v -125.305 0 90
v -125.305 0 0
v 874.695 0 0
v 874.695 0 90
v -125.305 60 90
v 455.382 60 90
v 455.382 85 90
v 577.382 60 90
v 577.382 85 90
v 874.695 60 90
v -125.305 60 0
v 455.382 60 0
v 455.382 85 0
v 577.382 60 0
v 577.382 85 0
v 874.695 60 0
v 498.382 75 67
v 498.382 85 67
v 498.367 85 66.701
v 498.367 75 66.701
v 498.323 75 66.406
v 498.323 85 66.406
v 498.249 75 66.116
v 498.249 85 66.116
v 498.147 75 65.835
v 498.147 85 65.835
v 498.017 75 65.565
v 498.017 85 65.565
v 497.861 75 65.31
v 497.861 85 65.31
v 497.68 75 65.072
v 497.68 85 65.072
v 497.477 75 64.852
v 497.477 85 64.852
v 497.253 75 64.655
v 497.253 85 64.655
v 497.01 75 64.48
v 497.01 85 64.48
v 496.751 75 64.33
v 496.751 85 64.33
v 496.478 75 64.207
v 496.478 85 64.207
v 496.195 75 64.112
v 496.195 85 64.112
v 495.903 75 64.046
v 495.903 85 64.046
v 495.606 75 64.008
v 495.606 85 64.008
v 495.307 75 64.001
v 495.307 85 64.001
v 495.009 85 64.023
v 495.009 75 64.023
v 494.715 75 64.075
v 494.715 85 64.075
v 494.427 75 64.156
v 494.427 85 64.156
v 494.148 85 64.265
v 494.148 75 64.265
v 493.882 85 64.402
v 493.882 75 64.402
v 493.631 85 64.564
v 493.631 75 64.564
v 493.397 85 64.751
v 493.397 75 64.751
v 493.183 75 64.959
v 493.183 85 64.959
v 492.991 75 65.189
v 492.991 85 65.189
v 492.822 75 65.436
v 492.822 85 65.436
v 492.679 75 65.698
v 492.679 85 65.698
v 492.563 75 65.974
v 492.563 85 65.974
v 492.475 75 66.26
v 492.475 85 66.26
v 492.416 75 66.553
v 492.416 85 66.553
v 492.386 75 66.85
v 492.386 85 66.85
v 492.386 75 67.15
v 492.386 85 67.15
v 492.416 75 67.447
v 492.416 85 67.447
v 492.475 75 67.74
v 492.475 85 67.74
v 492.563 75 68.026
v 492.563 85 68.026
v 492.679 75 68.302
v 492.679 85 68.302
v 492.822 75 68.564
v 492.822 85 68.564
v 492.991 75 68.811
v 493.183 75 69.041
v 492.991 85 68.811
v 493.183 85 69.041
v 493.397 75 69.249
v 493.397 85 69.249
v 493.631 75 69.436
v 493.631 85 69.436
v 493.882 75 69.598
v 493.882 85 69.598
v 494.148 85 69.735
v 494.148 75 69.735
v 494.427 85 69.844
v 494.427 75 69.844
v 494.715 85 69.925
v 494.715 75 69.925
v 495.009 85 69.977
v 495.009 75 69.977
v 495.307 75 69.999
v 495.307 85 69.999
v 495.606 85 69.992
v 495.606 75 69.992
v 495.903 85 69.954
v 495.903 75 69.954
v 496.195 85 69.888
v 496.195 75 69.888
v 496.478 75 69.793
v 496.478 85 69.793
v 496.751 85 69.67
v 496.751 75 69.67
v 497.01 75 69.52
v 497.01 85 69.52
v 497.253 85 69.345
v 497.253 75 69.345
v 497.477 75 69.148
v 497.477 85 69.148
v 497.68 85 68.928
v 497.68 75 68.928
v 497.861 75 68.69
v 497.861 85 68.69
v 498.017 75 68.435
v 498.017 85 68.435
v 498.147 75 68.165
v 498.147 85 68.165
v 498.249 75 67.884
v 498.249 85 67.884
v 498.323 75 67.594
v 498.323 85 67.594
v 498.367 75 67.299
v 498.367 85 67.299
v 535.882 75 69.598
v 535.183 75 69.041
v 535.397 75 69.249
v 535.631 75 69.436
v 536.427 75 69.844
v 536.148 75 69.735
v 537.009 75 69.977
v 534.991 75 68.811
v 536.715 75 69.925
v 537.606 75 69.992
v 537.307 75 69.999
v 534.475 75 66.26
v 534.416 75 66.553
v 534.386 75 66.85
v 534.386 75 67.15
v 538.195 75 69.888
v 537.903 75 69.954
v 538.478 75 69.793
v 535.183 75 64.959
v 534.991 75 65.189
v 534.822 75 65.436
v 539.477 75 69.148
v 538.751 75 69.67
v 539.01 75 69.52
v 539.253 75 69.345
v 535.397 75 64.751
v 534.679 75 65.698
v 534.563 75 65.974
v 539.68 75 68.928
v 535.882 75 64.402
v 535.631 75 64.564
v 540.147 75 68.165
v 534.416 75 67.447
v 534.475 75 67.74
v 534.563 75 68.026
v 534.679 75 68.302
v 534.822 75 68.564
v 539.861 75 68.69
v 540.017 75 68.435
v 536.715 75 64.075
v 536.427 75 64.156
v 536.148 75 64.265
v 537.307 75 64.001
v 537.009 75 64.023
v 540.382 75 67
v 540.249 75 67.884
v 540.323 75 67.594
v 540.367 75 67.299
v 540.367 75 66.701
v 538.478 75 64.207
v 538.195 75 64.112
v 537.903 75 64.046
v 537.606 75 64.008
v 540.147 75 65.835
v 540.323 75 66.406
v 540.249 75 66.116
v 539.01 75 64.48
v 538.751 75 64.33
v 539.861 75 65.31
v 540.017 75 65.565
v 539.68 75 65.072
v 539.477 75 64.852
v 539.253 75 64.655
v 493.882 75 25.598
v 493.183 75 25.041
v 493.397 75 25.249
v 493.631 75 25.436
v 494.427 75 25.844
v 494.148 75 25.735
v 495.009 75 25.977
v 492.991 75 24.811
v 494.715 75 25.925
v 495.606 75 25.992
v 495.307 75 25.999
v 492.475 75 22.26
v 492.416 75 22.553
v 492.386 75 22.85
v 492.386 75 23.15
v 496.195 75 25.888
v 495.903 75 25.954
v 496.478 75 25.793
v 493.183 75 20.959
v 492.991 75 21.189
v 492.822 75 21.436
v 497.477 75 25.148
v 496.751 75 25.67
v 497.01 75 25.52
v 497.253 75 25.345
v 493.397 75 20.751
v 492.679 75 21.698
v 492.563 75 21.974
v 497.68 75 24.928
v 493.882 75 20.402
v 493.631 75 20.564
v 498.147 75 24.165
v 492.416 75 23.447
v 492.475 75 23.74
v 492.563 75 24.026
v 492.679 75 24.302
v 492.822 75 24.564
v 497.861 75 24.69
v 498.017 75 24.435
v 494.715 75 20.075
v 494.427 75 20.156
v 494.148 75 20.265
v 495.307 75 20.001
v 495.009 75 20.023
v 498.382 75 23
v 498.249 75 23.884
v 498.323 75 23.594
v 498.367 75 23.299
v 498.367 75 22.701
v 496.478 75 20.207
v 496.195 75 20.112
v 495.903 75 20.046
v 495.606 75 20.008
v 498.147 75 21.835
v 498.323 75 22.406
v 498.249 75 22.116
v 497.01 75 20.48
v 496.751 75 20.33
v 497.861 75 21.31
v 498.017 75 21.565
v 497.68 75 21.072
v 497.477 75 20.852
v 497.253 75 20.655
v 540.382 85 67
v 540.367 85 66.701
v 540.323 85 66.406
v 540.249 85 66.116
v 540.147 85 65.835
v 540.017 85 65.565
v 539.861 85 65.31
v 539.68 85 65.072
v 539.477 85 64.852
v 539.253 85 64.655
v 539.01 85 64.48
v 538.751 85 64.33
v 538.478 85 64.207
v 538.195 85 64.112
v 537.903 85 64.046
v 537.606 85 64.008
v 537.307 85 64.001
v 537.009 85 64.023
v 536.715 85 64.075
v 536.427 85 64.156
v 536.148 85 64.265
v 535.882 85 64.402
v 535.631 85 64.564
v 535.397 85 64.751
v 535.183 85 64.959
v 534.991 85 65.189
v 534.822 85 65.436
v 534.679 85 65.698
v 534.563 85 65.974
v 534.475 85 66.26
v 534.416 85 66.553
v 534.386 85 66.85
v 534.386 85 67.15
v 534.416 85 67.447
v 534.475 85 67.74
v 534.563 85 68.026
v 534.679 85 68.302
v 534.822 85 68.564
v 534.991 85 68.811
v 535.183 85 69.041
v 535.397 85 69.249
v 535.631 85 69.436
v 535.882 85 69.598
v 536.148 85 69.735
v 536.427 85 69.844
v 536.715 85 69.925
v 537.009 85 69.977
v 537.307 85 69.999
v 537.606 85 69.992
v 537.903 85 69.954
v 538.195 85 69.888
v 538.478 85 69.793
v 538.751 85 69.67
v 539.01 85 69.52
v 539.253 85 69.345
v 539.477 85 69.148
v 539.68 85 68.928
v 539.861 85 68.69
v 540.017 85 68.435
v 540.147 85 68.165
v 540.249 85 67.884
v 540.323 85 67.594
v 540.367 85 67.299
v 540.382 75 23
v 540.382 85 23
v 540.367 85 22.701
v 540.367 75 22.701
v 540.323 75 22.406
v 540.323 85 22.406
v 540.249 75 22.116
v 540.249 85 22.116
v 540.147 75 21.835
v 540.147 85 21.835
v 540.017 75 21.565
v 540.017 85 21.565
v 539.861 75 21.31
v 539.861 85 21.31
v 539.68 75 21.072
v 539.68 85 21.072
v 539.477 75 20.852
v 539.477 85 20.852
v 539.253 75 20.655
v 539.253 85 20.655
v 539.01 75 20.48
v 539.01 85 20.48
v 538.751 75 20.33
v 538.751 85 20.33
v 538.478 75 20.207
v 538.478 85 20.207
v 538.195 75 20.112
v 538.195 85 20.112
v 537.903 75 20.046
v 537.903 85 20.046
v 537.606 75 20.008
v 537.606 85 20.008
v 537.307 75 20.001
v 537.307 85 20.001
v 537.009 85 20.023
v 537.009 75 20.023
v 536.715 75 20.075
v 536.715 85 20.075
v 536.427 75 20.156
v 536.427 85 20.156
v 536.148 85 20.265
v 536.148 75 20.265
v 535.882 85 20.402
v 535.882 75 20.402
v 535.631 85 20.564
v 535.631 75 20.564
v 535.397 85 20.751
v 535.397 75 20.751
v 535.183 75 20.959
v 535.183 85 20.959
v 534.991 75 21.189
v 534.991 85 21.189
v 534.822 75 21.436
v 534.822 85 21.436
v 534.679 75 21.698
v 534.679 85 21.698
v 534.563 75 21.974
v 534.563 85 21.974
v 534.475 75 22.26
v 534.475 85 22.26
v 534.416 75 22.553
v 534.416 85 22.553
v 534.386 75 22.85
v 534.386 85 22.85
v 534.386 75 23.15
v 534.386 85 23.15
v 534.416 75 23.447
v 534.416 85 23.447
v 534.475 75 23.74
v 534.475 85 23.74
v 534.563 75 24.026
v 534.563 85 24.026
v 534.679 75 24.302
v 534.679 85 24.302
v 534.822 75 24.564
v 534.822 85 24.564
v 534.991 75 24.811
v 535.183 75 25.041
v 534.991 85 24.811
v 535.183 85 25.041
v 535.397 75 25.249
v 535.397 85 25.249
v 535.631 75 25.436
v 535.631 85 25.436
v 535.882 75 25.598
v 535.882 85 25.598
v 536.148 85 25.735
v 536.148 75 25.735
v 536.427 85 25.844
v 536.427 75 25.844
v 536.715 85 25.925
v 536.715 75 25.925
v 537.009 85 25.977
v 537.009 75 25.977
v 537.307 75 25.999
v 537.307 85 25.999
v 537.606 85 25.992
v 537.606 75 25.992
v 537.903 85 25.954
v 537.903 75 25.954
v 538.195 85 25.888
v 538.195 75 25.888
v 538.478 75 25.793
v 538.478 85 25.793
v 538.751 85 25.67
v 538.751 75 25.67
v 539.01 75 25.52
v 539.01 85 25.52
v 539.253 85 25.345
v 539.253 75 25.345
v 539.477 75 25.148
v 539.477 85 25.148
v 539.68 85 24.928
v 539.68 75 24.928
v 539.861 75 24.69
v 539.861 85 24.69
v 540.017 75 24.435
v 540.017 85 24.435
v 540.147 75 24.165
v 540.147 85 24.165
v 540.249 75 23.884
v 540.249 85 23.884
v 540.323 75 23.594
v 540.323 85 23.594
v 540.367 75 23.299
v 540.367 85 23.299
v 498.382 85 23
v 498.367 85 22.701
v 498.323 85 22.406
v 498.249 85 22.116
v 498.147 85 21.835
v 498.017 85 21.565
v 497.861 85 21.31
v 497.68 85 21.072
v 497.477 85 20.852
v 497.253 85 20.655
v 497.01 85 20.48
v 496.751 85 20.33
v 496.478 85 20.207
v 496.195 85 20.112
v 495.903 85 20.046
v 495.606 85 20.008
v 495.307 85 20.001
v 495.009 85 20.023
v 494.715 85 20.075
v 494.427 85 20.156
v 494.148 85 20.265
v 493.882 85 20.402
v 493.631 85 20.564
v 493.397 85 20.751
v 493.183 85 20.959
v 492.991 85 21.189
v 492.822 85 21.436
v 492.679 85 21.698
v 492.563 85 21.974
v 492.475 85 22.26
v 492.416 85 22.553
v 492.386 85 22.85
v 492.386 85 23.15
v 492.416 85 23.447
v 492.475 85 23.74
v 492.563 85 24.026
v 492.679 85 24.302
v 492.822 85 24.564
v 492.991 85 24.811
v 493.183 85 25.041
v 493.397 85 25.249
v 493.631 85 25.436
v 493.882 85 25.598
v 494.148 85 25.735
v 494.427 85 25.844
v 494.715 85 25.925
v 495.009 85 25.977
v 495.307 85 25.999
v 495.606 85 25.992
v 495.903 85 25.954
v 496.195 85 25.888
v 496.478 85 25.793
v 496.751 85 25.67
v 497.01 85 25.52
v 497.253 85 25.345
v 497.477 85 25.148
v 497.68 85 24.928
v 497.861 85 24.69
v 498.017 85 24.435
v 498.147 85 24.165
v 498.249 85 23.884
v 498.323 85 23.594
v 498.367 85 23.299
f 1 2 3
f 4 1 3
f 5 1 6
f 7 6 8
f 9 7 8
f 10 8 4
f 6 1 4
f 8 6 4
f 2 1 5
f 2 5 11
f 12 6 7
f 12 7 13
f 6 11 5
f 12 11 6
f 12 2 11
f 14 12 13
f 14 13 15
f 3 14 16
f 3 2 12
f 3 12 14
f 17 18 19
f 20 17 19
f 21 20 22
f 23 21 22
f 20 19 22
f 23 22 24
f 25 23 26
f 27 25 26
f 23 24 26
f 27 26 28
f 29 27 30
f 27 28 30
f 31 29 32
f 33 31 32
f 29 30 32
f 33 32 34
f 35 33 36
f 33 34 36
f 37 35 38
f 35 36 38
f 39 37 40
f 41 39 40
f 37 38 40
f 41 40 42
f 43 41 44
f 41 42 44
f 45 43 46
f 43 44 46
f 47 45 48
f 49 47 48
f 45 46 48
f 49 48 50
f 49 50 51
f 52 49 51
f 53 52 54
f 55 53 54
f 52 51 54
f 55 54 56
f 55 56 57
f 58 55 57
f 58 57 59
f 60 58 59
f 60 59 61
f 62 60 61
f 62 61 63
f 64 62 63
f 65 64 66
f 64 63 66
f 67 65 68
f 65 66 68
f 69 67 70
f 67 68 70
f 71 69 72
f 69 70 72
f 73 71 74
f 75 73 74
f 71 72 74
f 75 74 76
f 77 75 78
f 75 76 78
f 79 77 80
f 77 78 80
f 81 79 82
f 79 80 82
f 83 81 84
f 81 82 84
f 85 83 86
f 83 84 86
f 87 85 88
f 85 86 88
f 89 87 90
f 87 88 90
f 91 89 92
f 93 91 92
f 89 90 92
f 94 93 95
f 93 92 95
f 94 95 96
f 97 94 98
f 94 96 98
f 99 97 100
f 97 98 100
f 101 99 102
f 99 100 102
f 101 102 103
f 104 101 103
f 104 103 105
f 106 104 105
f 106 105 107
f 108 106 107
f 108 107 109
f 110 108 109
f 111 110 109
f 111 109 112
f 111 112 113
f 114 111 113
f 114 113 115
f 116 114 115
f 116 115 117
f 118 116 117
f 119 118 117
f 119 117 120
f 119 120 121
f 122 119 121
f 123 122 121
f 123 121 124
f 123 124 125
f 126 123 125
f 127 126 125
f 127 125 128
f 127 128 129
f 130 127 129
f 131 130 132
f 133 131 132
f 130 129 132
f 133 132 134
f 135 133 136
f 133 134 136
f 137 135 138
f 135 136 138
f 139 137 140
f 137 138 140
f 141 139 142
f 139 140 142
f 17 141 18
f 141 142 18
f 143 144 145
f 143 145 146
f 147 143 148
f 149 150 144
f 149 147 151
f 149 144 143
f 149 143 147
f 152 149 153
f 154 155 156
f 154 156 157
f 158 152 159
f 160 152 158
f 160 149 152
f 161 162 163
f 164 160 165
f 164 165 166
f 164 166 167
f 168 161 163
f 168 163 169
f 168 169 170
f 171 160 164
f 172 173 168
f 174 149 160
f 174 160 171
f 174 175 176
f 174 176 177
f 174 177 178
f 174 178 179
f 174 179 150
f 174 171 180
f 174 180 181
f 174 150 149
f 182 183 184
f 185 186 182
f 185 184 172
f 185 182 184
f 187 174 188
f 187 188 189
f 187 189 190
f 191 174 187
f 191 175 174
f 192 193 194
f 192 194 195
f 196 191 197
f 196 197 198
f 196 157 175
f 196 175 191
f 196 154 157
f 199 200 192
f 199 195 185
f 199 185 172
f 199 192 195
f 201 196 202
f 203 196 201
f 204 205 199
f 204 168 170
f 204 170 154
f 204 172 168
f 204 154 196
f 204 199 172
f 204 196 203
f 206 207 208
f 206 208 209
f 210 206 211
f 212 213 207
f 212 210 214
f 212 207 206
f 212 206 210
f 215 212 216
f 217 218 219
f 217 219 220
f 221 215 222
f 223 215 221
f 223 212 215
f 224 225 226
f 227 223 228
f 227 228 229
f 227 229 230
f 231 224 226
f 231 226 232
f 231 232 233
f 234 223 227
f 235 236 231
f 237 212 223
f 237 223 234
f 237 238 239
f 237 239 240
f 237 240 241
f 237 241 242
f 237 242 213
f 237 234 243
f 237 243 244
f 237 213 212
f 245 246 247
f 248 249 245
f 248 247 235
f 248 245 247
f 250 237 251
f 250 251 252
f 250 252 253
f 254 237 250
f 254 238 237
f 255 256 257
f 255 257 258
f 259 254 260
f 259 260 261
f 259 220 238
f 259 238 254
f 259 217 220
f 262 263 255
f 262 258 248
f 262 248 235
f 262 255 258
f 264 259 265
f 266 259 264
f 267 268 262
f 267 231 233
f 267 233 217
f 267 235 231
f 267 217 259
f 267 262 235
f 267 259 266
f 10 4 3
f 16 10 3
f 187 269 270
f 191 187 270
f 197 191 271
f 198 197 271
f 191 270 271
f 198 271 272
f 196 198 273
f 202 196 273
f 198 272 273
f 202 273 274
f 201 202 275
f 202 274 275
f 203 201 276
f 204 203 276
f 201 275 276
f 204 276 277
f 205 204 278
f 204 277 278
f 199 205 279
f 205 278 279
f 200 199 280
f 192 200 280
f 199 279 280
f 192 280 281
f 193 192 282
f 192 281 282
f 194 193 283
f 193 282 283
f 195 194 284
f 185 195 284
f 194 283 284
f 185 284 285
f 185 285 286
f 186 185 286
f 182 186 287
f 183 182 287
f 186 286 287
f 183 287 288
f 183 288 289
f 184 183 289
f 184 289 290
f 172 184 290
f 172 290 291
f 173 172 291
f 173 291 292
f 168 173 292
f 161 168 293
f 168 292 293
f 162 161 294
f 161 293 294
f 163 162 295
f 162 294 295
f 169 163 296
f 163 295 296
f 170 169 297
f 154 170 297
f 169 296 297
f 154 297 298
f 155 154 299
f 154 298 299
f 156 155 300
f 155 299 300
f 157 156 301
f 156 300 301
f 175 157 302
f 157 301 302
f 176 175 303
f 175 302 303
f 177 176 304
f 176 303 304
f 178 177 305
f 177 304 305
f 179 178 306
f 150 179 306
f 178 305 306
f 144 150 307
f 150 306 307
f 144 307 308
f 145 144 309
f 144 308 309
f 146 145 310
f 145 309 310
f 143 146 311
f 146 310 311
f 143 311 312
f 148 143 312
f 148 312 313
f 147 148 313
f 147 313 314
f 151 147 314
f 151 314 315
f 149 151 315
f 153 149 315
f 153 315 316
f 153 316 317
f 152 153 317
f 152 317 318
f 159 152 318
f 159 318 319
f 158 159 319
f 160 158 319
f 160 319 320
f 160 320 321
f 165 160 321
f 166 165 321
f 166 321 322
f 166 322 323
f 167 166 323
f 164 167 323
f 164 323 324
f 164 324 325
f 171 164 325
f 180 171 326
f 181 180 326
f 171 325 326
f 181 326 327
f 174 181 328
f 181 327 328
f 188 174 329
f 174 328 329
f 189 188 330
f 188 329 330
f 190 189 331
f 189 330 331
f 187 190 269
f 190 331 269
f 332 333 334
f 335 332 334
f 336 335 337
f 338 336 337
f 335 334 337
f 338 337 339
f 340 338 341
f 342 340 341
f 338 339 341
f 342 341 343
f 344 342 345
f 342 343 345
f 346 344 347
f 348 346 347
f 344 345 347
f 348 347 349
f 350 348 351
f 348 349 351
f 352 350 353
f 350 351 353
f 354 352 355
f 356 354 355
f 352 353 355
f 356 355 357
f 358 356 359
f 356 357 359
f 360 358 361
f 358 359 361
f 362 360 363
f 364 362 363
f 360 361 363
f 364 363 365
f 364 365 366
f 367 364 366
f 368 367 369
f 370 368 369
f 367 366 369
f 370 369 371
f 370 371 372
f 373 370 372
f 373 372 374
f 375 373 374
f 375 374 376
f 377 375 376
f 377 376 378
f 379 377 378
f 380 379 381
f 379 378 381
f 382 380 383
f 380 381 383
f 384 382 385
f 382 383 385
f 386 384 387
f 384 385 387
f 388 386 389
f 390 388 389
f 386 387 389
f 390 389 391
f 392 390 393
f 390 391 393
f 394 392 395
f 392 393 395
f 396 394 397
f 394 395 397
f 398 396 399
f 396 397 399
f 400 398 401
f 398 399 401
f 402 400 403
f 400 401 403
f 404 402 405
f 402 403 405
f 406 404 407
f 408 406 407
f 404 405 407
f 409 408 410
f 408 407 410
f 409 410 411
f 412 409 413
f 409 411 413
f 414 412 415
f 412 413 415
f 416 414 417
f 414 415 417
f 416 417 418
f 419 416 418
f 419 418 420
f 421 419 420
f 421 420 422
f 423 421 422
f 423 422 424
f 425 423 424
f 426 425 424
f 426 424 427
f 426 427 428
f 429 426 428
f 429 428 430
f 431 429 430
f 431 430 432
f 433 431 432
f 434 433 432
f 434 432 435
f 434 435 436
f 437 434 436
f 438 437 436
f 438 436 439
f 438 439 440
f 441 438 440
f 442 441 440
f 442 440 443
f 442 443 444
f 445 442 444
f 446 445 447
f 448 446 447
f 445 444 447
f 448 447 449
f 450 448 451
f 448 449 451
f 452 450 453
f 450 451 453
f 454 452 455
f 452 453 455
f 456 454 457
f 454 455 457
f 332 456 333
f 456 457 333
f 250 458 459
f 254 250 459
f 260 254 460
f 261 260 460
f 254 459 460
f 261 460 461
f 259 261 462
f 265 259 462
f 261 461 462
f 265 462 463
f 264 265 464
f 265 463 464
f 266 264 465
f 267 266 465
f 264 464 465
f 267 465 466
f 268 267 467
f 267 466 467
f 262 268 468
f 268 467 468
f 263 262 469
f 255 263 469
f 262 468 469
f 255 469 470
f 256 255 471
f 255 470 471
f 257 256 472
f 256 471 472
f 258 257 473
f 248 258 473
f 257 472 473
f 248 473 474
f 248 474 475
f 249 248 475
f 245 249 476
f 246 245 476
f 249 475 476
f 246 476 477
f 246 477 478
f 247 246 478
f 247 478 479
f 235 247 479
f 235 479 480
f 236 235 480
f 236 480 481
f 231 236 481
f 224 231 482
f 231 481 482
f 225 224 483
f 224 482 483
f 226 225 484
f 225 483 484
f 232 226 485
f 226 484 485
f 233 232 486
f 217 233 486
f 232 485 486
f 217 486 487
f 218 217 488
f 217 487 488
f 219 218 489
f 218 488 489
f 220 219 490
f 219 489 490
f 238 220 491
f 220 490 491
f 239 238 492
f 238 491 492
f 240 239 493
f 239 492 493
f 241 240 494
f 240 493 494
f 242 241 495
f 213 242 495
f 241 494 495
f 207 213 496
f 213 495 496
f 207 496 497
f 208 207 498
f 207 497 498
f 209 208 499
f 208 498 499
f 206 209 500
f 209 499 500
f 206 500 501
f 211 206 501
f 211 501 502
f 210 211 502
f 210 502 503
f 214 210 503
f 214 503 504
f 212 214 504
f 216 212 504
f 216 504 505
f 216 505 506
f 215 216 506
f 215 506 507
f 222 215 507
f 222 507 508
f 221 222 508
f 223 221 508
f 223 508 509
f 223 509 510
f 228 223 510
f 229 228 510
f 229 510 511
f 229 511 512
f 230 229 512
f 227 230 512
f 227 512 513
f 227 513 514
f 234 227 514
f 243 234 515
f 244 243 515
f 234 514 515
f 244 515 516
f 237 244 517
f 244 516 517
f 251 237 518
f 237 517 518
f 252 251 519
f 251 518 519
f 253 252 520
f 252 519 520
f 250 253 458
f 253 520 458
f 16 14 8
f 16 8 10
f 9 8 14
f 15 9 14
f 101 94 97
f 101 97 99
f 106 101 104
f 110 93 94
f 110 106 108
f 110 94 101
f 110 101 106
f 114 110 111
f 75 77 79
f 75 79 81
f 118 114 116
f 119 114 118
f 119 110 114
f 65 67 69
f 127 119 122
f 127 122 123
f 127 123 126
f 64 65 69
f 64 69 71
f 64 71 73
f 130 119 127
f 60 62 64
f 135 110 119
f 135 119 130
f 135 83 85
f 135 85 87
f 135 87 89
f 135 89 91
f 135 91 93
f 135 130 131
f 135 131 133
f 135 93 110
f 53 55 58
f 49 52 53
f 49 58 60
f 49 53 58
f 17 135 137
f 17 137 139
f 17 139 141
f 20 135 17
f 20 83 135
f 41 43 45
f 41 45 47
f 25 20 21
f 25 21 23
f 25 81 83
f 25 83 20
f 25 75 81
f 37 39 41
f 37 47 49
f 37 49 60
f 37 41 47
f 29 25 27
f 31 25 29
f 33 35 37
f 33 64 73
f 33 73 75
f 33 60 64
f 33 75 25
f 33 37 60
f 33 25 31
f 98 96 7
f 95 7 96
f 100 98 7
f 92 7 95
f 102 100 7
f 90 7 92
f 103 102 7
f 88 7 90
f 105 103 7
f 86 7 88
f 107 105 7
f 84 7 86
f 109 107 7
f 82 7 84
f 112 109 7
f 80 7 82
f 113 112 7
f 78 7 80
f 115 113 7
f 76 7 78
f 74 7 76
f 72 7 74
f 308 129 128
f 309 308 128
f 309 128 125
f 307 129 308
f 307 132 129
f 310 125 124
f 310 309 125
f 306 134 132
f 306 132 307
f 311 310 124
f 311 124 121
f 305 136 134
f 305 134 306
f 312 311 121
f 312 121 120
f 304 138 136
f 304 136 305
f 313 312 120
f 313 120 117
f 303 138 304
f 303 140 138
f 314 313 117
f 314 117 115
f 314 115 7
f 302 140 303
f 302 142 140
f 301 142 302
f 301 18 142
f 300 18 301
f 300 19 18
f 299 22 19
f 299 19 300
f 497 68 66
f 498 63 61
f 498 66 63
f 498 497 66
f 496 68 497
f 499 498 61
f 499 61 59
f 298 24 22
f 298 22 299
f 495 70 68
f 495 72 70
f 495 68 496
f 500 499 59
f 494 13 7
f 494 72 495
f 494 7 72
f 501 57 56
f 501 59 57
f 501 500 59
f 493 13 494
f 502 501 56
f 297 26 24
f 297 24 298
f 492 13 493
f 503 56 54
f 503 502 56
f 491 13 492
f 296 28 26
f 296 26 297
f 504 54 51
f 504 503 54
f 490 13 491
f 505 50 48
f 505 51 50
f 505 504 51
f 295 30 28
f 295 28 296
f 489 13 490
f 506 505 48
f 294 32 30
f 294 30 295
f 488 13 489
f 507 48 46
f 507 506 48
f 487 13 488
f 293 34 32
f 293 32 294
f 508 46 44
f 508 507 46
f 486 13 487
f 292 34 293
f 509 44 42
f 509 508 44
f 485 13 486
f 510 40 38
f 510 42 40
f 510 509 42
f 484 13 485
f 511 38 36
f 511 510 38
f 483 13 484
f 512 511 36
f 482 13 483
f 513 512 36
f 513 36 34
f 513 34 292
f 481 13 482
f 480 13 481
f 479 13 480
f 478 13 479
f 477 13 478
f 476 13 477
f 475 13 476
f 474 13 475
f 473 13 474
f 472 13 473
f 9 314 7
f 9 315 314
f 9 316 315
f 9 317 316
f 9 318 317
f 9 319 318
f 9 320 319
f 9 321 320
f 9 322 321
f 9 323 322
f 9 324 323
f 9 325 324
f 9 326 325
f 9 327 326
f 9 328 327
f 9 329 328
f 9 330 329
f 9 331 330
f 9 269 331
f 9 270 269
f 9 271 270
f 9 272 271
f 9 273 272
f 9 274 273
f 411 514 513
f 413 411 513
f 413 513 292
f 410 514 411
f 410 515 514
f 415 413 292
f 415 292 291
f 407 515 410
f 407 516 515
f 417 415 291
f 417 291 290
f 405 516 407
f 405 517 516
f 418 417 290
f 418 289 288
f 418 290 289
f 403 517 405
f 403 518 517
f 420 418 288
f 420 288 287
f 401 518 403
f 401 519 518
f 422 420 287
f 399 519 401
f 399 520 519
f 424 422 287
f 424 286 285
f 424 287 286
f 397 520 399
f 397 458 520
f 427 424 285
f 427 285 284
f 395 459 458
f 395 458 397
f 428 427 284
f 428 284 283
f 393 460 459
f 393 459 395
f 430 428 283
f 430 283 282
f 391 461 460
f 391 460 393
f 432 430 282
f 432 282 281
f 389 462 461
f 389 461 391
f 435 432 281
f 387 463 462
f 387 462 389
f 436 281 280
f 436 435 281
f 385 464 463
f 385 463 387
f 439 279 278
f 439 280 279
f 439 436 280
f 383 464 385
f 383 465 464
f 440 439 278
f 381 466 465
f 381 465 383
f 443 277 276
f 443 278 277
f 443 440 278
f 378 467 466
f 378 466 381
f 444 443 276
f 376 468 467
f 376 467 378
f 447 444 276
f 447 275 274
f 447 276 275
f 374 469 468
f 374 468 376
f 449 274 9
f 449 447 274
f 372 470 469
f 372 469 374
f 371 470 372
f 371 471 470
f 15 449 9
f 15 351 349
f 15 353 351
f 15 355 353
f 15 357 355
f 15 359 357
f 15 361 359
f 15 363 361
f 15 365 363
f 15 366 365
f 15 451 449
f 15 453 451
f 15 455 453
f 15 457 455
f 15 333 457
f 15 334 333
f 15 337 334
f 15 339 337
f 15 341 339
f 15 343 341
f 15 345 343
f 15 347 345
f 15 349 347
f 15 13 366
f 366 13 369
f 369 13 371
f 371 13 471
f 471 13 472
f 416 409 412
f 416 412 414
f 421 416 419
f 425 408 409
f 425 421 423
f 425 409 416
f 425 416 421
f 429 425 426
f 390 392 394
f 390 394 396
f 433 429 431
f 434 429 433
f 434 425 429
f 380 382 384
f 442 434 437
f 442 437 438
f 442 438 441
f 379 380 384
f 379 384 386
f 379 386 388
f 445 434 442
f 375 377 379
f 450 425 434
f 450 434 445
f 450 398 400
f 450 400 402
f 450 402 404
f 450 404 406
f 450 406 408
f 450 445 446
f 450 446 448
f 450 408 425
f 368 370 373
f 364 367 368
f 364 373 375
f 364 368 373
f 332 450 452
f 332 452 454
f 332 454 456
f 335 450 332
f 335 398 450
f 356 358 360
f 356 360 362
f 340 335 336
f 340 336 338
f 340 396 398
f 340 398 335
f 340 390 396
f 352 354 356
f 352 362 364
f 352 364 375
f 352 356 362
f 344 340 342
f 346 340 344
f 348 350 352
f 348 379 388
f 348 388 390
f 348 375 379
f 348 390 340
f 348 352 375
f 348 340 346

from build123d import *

# Parameters (mm, degrees)
SKETCH1_W           = 1000
SKETCH1_H           = 90
BOSS_EXTRUDE1_DEPTH = 60
SKETCH2_W           = 122
SKETCH2_H           = 90
BOSS_EXTRUDE2_DEPTH = 25
SKETCH3_R           = 3
CUT_EXTRUDE1_DEPTH  = 10


with BuildPart() as part:
    # Sketch1 → Boss-Extrude1 (new body)
    with BuildSketch(Plane(origin=(0, 0, 0), x_dir=(1, 0, 0), z_dir=(0, 1, 0))):
        with Locations((374.694533762, -45)):
            Rectangle(SKETCH1_W, SKETCH1_H)
    extrude(amount=BOSS_EXTRUDE1_DEPTH)

    # Sketch2 → Boss-Extrude2 (add)
    with BuildSketch(Plane(origin=(0, 60, 0), x_dir=(1, 0, 0), z_dir=(0, 1, 0))):
        with Locations((516.382198595, -45)):
            Rectangle(SKETCH2_W, SKETCH2_H)
    extrude(amount=BOSS_EXTRUDE2_DEPTH)

    # Sketch3 → Cut-Extrude1 (cut)
    with BuildSketch(Plane(origin=(0, 85, 0), x_dir=(1, 0, 0), z_dir=(0, 1, 0))):
        with Locations((495.382198595, -23)):
            Circle(SKETCH3_R)
        with Locations((537.382198595, -23)):
            Circle(SKETCH3_R)
        with Locations((537.382198595, -67)):
            Circle(SKETCH3_R)
        with Locations((495.382198595, -67)):
            Circle(SKETCH3_R)
    extrude(amount=-CUT_EXTRUDE1_DEPTH, mode=Mode.SUBTRACT)


solid = part.part
